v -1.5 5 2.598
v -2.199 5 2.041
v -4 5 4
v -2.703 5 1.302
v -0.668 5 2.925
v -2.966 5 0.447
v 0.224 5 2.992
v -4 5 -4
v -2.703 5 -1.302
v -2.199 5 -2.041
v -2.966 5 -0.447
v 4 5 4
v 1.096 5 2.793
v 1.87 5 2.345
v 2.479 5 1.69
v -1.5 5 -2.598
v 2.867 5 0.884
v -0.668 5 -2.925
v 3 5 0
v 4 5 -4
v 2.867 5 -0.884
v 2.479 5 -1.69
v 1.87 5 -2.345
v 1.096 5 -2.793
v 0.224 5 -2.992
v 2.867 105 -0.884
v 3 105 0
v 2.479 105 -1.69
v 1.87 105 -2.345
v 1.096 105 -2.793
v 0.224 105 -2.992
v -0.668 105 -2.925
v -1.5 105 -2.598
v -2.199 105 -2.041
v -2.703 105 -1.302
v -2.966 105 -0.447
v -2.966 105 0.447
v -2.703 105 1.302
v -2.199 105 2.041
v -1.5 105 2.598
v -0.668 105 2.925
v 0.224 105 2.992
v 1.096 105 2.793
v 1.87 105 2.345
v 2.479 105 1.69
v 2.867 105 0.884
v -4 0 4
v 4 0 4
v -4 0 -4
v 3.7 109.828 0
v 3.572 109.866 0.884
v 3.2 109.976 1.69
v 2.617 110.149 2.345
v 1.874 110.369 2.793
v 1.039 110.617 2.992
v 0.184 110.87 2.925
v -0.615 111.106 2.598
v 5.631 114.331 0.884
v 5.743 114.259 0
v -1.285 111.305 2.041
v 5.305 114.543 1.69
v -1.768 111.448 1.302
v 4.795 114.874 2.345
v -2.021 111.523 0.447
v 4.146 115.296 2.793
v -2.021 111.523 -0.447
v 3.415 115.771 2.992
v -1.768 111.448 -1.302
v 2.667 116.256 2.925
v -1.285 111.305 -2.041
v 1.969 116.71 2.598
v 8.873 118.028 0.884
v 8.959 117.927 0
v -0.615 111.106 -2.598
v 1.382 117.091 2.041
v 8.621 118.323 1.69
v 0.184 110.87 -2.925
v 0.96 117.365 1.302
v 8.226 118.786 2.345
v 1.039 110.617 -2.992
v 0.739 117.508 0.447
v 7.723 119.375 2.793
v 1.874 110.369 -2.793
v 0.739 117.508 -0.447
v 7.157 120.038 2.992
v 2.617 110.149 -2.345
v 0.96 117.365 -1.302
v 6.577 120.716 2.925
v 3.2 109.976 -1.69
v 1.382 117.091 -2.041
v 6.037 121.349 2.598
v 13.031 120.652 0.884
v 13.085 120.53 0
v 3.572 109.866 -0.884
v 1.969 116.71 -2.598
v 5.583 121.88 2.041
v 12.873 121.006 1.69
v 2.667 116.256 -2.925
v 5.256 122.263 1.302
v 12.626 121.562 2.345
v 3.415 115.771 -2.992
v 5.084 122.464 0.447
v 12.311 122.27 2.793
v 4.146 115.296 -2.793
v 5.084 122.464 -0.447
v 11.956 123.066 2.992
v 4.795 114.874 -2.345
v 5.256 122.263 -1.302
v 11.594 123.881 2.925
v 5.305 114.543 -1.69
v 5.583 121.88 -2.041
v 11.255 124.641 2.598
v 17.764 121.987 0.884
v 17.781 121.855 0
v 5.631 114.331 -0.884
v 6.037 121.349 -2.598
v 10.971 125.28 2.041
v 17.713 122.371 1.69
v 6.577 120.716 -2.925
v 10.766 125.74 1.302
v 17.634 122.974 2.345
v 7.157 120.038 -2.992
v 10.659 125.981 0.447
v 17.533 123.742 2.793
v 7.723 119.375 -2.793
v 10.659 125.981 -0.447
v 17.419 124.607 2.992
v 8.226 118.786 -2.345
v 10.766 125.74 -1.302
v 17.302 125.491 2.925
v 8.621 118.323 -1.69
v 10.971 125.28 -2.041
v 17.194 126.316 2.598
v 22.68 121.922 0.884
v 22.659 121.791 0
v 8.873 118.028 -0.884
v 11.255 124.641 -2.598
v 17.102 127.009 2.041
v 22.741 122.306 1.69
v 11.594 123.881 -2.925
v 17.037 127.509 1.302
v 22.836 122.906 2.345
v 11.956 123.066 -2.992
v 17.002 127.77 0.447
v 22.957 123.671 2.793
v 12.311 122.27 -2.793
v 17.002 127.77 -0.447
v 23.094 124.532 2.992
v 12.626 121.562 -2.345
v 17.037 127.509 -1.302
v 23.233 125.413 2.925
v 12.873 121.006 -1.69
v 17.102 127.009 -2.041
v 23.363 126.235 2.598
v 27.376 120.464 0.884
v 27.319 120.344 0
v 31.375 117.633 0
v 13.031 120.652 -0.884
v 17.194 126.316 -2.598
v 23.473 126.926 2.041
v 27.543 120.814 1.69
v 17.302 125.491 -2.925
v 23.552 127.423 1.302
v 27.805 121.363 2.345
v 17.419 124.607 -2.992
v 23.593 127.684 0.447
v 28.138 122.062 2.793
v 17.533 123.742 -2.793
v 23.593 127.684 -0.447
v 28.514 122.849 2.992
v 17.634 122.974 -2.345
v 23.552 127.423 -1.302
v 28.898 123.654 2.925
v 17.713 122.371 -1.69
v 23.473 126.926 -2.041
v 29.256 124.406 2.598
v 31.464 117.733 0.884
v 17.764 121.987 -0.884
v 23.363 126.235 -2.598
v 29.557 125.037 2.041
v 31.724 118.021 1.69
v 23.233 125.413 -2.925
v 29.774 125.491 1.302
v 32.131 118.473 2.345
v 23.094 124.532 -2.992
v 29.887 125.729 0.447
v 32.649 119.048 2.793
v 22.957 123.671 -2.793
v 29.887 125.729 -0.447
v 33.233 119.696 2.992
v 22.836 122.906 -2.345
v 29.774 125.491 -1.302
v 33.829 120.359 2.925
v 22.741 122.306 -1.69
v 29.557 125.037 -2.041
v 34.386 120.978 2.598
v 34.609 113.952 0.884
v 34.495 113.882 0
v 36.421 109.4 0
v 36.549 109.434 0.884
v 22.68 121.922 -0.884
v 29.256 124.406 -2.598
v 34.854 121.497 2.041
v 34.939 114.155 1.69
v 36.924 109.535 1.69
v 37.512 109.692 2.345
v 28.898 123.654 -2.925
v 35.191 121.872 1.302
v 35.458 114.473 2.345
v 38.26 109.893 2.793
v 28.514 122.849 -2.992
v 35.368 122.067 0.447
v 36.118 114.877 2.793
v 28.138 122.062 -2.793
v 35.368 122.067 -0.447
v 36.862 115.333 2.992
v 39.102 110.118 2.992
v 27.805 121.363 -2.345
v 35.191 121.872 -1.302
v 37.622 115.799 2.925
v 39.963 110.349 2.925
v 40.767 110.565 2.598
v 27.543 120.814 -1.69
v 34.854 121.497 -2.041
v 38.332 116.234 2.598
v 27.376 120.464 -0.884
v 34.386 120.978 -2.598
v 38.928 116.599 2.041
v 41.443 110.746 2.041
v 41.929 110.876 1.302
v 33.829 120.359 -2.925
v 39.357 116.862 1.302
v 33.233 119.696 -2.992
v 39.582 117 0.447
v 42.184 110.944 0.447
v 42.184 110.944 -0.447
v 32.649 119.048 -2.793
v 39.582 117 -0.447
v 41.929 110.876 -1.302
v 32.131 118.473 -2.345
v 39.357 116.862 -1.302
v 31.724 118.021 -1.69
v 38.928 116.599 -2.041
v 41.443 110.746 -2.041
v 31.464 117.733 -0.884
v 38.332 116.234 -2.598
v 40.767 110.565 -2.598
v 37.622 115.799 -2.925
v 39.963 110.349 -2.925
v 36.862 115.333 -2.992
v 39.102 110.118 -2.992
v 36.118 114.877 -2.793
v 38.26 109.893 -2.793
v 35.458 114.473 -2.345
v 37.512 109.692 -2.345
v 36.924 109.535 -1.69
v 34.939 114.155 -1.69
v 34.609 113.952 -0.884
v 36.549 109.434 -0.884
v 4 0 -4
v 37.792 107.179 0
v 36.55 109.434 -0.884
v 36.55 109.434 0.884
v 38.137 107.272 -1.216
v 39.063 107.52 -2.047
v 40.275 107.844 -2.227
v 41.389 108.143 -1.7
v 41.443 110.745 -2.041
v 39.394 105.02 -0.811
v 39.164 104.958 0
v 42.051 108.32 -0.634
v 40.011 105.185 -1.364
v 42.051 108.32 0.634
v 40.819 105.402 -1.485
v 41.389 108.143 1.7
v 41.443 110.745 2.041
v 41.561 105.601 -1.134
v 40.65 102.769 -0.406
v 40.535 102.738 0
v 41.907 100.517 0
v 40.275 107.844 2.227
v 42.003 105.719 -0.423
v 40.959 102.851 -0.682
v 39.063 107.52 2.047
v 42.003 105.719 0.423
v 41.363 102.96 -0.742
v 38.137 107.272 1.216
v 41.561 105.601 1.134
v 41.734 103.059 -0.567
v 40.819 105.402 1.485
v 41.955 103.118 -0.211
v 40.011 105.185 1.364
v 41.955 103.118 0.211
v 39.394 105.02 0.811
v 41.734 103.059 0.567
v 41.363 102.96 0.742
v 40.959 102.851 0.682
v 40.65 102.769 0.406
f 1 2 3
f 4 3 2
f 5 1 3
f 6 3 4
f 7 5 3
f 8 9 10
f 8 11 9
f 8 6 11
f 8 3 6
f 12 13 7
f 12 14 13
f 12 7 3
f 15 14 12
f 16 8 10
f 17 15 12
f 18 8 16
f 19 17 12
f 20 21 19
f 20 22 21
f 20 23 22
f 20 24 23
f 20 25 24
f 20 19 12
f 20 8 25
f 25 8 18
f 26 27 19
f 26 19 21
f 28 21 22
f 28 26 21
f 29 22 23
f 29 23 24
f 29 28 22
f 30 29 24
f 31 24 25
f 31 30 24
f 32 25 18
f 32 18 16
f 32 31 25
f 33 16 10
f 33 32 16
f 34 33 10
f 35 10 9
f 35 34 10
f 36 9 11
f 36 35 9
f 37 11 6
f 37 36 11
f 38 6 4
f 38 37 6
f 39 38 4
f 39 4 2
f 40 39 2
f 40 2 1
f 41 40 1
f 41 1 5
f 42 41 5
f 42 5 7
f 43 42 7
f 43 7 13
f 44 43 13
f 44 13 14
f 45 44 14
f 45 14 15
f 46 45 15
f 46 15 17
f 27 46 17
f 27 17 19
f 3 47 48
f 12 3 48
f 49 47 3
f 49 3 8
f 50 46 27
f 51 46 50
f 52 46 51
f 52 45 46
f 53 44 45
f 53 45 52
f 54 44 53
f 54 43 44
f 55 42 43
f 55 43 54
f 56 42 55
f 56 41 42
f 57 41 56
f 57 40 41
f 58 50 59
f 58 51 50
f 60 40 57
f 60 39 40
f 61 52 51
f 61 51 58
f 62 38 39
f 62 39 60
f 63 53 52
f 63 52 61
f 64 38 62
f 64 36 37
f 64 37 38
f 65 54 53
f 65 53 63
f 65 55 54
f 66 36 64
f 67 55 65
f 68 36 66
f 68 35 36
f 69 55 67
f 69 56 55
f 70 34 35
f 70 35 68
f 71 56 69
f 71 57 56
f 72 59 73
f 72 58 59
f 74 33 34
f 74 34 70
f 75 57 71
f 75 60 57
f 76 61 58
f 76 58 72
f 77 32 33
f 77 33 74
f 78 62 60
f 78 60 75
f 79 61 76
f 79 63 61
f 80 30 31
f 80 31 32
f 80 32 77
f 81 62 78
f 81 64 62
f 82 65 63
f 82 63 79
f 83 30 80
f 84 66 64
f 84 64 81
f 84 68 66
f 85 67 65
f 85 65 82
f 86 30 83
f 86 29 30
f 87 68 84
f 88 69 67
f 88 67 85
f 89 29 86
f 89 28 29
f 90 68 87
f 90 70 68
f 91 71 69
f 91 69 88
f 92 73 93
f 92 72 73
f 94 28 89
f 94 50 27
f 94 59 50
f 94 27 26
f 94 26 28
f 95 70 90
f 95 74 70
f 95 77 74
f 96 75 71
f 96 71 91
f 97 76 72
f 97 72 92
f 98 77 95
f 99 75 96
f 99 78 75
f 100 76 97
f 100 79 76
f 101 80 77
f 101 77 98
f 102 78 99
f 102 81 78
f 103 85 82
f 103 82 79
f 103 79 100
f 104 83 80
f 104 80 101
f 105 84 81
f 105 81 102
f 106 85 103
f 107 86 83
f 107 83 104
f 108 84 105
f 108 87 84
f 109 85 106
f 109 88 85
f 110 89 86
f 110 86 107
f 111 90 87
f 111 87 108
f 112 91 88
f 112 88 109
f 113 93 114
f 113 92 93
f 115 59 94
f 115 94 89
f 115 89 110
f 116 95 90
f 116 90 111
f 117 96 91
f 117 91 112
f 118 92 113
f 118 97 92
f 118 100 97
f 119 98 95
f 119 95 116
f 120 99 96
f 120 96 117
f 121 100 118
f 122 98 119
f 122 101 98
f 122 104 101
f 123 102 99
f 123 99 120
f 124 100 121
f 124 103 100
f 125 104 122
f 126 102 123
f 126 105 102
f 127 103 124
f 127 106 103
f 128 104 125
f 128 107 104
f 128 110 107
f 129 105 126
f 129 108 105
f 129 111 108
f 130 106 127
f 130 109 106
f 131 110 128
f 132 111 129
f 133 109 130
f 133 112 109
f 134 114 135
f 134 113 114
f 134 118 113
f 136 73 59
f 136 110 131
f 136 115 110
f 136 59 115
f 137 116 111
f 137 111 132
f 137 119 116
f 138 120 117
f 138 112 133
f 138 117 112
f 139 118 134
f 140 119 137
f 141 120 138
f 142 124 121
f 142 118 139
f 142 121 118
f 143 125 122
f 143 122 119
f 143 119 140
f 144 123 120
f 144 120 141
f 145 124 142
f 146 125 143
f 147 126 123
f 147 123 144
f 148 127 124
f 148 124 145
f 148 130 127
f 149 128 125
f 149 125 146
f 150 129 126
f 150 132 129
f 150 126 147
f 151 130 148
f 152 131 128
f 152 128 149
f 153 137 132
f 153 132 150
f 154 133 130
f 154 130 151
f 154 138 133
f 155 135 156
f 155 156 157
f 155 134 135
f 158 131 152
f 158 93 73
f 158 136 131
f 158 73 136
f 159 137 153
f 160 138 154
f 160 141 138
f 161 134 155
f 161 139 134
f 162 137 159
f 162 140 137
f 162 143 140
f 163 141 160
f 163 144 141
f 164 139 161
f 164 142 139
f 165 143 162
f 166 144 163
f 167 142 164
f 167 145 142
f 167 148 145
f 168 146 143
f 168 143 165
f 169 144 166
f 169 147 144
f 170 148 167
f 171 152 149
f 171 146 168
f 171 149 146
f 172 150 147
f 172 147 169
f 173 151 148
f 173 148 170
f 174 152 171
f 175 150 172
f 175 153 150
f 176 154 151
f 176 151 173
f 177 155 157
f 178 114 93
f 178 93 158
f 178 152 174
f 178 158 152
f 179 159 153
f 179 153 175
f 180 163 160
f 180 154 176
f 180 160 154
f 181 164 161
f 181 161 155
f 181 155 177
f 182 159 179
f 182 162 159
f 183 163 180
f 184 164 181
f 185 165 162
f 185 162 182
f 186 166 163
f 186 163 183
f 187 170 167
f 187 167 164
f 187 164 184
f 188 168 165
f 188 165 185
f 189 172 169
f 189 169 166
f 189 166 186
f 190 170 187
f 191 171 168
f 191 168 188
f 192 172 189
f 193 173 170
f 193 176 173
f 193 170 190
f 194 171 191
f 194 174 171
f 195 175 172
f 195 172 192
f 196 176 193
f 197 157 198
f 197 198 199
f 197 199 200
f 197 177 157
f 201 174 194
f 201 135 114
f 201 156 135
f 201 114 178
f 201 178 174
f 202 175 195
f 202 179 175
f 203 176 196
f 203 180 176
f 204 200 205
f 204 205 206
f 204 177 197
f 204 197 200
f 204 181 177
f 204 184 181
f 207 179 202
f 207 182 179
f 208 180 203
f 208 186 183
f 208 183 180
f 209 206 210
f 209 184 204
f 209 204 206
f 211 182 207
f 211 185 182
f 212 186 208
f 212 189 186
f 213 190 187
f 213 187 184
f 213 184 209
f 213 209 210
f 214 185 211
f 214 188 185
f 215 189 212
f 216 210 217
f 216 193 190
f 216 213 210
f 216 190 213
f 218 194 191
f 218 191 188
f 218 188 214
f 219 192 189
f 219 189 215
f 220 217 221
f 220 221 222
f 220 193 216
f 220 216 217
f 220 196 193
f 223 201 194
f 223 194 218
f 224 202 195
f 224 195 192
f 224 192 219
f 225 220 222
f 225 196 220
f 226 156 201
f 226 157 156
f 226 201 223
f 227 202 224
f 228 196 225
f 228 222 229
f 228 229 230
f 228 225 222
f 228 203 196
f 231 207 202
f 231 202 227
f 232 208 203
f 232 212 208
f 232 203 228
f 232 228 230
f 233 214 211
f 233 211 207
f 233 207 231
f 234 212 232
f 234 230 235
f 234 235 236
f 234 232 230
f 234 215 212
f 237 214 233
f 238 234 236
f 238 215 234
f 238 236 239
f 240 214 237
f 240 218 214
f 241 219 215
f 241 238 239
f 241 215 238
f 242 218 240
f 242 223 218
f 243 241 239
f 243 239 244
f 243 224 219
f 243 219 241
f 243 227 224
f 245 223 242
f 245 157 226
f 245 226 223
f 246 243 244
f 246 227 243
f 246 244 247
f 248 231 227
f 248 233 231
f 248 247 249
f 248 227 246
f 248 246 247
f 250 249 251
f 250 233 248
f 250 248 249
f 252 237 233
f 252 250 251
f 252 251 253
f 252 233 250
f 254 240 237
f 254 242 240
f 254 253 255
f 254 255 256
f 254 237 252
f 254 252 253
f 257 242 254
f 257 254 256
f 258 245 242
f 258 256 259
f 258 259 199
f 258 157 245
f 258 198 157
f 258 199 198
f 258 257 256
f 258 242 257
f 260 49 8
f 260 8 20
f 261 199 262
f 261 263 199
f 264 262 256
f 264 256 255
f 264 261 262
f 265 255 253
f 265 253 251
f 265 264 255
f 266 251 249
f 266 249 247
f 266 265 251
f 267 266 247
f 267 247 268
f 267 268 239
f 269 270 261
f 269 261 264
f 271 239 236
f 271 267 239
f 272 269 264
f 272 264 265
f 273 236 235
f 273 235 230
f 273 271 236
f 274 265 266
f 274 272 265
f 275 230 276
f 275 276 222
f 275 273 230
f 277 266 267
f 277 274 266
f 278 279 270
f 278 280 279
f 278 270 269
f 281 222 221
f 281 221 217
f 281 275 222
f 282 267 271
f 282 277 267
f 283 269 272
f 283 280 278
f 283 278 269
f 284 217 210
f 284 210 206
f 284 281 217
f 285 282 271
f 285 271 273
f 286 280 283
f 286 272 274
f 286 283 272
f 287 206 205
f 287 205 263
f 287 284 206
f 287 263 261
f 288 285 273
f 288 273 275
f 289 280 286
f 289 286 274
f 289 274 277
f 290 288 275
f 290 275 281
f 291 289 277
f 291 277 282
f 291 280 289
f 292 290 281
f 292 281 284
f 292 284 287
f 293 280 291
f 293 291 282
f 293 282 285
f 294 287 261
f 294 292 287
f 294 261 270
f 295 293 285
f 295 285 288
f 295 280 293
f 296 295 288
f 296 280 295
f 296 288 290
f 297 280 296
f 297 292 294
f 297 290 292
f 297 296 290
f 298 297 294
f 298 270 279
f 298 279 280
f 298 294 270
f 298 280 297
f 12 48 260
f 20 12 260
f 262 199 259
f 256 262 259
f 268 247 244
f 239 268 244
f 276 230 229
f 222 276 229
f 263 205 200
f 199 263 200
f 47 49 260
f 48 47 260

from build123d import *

# Parameters (mm, degrees)
SKETCH1_W           = 8
SKETCH1_H           = 8
BOSS_EXTRUDE1_DEPTH = 5
SKETCH3_R           = 3
CHAMFER1_SIZE2      = 3
CHAMFER1_SIZE       = 10


with BuildPart() as part:
    # Sketch1 → Boss-Extrude1 (new body)
    with BuildSketch(Plane(origin=(0, 0, 0), x_dir=(1, 0, 0), z_dir=(0, 1, 0))):
        Rectangle(SKETCH1_W, SKETCH1_H)
    extrude(amount=BOSS_EXTRUDE1_DEPTH)

    # Sweep1: sweep along a path in Sketch2
    with BuildLine(Plane.XY) as sweep1_path:
        Line((0, 5), (0, 105))
        ThreePointArc((0, 105), (17.389476156, 124.828897227), (39.318516526, 110.176380902))
        Line((39.318516526, 110.176380902), (41.906706977, 100.517122639))
    # Sketch3 → Sweep1 (sweep)
    with BuildSketch(Plane(origin=(0, 5, 0), x_dir=(1, 0, 0), z_dir=(0, 1, 0))):
        Circle(SKETCH3_R)
    sweep(path=sweep1_path.line)

    # Chamfer1
    chamfer1_edges = [part.edges().sort_by_distance(p)[0] for p in [
        (44.804484456, 101.293579774, 0),
    ]]
    chamfer1_side = [part.faces().sort_by_distance(p)[0] for p in [
        (44.788955313, 101.351535324, 0),
    ]]
    chamfer(chamfer1_edges, length=CHAMFER1_SIZE - 0.0001, length2=CHAMFER1_SIZE2 - 0.0001, reference=chamfer1_side[0])  # a hair under: the kernel refuses the full size


solid = part.part
